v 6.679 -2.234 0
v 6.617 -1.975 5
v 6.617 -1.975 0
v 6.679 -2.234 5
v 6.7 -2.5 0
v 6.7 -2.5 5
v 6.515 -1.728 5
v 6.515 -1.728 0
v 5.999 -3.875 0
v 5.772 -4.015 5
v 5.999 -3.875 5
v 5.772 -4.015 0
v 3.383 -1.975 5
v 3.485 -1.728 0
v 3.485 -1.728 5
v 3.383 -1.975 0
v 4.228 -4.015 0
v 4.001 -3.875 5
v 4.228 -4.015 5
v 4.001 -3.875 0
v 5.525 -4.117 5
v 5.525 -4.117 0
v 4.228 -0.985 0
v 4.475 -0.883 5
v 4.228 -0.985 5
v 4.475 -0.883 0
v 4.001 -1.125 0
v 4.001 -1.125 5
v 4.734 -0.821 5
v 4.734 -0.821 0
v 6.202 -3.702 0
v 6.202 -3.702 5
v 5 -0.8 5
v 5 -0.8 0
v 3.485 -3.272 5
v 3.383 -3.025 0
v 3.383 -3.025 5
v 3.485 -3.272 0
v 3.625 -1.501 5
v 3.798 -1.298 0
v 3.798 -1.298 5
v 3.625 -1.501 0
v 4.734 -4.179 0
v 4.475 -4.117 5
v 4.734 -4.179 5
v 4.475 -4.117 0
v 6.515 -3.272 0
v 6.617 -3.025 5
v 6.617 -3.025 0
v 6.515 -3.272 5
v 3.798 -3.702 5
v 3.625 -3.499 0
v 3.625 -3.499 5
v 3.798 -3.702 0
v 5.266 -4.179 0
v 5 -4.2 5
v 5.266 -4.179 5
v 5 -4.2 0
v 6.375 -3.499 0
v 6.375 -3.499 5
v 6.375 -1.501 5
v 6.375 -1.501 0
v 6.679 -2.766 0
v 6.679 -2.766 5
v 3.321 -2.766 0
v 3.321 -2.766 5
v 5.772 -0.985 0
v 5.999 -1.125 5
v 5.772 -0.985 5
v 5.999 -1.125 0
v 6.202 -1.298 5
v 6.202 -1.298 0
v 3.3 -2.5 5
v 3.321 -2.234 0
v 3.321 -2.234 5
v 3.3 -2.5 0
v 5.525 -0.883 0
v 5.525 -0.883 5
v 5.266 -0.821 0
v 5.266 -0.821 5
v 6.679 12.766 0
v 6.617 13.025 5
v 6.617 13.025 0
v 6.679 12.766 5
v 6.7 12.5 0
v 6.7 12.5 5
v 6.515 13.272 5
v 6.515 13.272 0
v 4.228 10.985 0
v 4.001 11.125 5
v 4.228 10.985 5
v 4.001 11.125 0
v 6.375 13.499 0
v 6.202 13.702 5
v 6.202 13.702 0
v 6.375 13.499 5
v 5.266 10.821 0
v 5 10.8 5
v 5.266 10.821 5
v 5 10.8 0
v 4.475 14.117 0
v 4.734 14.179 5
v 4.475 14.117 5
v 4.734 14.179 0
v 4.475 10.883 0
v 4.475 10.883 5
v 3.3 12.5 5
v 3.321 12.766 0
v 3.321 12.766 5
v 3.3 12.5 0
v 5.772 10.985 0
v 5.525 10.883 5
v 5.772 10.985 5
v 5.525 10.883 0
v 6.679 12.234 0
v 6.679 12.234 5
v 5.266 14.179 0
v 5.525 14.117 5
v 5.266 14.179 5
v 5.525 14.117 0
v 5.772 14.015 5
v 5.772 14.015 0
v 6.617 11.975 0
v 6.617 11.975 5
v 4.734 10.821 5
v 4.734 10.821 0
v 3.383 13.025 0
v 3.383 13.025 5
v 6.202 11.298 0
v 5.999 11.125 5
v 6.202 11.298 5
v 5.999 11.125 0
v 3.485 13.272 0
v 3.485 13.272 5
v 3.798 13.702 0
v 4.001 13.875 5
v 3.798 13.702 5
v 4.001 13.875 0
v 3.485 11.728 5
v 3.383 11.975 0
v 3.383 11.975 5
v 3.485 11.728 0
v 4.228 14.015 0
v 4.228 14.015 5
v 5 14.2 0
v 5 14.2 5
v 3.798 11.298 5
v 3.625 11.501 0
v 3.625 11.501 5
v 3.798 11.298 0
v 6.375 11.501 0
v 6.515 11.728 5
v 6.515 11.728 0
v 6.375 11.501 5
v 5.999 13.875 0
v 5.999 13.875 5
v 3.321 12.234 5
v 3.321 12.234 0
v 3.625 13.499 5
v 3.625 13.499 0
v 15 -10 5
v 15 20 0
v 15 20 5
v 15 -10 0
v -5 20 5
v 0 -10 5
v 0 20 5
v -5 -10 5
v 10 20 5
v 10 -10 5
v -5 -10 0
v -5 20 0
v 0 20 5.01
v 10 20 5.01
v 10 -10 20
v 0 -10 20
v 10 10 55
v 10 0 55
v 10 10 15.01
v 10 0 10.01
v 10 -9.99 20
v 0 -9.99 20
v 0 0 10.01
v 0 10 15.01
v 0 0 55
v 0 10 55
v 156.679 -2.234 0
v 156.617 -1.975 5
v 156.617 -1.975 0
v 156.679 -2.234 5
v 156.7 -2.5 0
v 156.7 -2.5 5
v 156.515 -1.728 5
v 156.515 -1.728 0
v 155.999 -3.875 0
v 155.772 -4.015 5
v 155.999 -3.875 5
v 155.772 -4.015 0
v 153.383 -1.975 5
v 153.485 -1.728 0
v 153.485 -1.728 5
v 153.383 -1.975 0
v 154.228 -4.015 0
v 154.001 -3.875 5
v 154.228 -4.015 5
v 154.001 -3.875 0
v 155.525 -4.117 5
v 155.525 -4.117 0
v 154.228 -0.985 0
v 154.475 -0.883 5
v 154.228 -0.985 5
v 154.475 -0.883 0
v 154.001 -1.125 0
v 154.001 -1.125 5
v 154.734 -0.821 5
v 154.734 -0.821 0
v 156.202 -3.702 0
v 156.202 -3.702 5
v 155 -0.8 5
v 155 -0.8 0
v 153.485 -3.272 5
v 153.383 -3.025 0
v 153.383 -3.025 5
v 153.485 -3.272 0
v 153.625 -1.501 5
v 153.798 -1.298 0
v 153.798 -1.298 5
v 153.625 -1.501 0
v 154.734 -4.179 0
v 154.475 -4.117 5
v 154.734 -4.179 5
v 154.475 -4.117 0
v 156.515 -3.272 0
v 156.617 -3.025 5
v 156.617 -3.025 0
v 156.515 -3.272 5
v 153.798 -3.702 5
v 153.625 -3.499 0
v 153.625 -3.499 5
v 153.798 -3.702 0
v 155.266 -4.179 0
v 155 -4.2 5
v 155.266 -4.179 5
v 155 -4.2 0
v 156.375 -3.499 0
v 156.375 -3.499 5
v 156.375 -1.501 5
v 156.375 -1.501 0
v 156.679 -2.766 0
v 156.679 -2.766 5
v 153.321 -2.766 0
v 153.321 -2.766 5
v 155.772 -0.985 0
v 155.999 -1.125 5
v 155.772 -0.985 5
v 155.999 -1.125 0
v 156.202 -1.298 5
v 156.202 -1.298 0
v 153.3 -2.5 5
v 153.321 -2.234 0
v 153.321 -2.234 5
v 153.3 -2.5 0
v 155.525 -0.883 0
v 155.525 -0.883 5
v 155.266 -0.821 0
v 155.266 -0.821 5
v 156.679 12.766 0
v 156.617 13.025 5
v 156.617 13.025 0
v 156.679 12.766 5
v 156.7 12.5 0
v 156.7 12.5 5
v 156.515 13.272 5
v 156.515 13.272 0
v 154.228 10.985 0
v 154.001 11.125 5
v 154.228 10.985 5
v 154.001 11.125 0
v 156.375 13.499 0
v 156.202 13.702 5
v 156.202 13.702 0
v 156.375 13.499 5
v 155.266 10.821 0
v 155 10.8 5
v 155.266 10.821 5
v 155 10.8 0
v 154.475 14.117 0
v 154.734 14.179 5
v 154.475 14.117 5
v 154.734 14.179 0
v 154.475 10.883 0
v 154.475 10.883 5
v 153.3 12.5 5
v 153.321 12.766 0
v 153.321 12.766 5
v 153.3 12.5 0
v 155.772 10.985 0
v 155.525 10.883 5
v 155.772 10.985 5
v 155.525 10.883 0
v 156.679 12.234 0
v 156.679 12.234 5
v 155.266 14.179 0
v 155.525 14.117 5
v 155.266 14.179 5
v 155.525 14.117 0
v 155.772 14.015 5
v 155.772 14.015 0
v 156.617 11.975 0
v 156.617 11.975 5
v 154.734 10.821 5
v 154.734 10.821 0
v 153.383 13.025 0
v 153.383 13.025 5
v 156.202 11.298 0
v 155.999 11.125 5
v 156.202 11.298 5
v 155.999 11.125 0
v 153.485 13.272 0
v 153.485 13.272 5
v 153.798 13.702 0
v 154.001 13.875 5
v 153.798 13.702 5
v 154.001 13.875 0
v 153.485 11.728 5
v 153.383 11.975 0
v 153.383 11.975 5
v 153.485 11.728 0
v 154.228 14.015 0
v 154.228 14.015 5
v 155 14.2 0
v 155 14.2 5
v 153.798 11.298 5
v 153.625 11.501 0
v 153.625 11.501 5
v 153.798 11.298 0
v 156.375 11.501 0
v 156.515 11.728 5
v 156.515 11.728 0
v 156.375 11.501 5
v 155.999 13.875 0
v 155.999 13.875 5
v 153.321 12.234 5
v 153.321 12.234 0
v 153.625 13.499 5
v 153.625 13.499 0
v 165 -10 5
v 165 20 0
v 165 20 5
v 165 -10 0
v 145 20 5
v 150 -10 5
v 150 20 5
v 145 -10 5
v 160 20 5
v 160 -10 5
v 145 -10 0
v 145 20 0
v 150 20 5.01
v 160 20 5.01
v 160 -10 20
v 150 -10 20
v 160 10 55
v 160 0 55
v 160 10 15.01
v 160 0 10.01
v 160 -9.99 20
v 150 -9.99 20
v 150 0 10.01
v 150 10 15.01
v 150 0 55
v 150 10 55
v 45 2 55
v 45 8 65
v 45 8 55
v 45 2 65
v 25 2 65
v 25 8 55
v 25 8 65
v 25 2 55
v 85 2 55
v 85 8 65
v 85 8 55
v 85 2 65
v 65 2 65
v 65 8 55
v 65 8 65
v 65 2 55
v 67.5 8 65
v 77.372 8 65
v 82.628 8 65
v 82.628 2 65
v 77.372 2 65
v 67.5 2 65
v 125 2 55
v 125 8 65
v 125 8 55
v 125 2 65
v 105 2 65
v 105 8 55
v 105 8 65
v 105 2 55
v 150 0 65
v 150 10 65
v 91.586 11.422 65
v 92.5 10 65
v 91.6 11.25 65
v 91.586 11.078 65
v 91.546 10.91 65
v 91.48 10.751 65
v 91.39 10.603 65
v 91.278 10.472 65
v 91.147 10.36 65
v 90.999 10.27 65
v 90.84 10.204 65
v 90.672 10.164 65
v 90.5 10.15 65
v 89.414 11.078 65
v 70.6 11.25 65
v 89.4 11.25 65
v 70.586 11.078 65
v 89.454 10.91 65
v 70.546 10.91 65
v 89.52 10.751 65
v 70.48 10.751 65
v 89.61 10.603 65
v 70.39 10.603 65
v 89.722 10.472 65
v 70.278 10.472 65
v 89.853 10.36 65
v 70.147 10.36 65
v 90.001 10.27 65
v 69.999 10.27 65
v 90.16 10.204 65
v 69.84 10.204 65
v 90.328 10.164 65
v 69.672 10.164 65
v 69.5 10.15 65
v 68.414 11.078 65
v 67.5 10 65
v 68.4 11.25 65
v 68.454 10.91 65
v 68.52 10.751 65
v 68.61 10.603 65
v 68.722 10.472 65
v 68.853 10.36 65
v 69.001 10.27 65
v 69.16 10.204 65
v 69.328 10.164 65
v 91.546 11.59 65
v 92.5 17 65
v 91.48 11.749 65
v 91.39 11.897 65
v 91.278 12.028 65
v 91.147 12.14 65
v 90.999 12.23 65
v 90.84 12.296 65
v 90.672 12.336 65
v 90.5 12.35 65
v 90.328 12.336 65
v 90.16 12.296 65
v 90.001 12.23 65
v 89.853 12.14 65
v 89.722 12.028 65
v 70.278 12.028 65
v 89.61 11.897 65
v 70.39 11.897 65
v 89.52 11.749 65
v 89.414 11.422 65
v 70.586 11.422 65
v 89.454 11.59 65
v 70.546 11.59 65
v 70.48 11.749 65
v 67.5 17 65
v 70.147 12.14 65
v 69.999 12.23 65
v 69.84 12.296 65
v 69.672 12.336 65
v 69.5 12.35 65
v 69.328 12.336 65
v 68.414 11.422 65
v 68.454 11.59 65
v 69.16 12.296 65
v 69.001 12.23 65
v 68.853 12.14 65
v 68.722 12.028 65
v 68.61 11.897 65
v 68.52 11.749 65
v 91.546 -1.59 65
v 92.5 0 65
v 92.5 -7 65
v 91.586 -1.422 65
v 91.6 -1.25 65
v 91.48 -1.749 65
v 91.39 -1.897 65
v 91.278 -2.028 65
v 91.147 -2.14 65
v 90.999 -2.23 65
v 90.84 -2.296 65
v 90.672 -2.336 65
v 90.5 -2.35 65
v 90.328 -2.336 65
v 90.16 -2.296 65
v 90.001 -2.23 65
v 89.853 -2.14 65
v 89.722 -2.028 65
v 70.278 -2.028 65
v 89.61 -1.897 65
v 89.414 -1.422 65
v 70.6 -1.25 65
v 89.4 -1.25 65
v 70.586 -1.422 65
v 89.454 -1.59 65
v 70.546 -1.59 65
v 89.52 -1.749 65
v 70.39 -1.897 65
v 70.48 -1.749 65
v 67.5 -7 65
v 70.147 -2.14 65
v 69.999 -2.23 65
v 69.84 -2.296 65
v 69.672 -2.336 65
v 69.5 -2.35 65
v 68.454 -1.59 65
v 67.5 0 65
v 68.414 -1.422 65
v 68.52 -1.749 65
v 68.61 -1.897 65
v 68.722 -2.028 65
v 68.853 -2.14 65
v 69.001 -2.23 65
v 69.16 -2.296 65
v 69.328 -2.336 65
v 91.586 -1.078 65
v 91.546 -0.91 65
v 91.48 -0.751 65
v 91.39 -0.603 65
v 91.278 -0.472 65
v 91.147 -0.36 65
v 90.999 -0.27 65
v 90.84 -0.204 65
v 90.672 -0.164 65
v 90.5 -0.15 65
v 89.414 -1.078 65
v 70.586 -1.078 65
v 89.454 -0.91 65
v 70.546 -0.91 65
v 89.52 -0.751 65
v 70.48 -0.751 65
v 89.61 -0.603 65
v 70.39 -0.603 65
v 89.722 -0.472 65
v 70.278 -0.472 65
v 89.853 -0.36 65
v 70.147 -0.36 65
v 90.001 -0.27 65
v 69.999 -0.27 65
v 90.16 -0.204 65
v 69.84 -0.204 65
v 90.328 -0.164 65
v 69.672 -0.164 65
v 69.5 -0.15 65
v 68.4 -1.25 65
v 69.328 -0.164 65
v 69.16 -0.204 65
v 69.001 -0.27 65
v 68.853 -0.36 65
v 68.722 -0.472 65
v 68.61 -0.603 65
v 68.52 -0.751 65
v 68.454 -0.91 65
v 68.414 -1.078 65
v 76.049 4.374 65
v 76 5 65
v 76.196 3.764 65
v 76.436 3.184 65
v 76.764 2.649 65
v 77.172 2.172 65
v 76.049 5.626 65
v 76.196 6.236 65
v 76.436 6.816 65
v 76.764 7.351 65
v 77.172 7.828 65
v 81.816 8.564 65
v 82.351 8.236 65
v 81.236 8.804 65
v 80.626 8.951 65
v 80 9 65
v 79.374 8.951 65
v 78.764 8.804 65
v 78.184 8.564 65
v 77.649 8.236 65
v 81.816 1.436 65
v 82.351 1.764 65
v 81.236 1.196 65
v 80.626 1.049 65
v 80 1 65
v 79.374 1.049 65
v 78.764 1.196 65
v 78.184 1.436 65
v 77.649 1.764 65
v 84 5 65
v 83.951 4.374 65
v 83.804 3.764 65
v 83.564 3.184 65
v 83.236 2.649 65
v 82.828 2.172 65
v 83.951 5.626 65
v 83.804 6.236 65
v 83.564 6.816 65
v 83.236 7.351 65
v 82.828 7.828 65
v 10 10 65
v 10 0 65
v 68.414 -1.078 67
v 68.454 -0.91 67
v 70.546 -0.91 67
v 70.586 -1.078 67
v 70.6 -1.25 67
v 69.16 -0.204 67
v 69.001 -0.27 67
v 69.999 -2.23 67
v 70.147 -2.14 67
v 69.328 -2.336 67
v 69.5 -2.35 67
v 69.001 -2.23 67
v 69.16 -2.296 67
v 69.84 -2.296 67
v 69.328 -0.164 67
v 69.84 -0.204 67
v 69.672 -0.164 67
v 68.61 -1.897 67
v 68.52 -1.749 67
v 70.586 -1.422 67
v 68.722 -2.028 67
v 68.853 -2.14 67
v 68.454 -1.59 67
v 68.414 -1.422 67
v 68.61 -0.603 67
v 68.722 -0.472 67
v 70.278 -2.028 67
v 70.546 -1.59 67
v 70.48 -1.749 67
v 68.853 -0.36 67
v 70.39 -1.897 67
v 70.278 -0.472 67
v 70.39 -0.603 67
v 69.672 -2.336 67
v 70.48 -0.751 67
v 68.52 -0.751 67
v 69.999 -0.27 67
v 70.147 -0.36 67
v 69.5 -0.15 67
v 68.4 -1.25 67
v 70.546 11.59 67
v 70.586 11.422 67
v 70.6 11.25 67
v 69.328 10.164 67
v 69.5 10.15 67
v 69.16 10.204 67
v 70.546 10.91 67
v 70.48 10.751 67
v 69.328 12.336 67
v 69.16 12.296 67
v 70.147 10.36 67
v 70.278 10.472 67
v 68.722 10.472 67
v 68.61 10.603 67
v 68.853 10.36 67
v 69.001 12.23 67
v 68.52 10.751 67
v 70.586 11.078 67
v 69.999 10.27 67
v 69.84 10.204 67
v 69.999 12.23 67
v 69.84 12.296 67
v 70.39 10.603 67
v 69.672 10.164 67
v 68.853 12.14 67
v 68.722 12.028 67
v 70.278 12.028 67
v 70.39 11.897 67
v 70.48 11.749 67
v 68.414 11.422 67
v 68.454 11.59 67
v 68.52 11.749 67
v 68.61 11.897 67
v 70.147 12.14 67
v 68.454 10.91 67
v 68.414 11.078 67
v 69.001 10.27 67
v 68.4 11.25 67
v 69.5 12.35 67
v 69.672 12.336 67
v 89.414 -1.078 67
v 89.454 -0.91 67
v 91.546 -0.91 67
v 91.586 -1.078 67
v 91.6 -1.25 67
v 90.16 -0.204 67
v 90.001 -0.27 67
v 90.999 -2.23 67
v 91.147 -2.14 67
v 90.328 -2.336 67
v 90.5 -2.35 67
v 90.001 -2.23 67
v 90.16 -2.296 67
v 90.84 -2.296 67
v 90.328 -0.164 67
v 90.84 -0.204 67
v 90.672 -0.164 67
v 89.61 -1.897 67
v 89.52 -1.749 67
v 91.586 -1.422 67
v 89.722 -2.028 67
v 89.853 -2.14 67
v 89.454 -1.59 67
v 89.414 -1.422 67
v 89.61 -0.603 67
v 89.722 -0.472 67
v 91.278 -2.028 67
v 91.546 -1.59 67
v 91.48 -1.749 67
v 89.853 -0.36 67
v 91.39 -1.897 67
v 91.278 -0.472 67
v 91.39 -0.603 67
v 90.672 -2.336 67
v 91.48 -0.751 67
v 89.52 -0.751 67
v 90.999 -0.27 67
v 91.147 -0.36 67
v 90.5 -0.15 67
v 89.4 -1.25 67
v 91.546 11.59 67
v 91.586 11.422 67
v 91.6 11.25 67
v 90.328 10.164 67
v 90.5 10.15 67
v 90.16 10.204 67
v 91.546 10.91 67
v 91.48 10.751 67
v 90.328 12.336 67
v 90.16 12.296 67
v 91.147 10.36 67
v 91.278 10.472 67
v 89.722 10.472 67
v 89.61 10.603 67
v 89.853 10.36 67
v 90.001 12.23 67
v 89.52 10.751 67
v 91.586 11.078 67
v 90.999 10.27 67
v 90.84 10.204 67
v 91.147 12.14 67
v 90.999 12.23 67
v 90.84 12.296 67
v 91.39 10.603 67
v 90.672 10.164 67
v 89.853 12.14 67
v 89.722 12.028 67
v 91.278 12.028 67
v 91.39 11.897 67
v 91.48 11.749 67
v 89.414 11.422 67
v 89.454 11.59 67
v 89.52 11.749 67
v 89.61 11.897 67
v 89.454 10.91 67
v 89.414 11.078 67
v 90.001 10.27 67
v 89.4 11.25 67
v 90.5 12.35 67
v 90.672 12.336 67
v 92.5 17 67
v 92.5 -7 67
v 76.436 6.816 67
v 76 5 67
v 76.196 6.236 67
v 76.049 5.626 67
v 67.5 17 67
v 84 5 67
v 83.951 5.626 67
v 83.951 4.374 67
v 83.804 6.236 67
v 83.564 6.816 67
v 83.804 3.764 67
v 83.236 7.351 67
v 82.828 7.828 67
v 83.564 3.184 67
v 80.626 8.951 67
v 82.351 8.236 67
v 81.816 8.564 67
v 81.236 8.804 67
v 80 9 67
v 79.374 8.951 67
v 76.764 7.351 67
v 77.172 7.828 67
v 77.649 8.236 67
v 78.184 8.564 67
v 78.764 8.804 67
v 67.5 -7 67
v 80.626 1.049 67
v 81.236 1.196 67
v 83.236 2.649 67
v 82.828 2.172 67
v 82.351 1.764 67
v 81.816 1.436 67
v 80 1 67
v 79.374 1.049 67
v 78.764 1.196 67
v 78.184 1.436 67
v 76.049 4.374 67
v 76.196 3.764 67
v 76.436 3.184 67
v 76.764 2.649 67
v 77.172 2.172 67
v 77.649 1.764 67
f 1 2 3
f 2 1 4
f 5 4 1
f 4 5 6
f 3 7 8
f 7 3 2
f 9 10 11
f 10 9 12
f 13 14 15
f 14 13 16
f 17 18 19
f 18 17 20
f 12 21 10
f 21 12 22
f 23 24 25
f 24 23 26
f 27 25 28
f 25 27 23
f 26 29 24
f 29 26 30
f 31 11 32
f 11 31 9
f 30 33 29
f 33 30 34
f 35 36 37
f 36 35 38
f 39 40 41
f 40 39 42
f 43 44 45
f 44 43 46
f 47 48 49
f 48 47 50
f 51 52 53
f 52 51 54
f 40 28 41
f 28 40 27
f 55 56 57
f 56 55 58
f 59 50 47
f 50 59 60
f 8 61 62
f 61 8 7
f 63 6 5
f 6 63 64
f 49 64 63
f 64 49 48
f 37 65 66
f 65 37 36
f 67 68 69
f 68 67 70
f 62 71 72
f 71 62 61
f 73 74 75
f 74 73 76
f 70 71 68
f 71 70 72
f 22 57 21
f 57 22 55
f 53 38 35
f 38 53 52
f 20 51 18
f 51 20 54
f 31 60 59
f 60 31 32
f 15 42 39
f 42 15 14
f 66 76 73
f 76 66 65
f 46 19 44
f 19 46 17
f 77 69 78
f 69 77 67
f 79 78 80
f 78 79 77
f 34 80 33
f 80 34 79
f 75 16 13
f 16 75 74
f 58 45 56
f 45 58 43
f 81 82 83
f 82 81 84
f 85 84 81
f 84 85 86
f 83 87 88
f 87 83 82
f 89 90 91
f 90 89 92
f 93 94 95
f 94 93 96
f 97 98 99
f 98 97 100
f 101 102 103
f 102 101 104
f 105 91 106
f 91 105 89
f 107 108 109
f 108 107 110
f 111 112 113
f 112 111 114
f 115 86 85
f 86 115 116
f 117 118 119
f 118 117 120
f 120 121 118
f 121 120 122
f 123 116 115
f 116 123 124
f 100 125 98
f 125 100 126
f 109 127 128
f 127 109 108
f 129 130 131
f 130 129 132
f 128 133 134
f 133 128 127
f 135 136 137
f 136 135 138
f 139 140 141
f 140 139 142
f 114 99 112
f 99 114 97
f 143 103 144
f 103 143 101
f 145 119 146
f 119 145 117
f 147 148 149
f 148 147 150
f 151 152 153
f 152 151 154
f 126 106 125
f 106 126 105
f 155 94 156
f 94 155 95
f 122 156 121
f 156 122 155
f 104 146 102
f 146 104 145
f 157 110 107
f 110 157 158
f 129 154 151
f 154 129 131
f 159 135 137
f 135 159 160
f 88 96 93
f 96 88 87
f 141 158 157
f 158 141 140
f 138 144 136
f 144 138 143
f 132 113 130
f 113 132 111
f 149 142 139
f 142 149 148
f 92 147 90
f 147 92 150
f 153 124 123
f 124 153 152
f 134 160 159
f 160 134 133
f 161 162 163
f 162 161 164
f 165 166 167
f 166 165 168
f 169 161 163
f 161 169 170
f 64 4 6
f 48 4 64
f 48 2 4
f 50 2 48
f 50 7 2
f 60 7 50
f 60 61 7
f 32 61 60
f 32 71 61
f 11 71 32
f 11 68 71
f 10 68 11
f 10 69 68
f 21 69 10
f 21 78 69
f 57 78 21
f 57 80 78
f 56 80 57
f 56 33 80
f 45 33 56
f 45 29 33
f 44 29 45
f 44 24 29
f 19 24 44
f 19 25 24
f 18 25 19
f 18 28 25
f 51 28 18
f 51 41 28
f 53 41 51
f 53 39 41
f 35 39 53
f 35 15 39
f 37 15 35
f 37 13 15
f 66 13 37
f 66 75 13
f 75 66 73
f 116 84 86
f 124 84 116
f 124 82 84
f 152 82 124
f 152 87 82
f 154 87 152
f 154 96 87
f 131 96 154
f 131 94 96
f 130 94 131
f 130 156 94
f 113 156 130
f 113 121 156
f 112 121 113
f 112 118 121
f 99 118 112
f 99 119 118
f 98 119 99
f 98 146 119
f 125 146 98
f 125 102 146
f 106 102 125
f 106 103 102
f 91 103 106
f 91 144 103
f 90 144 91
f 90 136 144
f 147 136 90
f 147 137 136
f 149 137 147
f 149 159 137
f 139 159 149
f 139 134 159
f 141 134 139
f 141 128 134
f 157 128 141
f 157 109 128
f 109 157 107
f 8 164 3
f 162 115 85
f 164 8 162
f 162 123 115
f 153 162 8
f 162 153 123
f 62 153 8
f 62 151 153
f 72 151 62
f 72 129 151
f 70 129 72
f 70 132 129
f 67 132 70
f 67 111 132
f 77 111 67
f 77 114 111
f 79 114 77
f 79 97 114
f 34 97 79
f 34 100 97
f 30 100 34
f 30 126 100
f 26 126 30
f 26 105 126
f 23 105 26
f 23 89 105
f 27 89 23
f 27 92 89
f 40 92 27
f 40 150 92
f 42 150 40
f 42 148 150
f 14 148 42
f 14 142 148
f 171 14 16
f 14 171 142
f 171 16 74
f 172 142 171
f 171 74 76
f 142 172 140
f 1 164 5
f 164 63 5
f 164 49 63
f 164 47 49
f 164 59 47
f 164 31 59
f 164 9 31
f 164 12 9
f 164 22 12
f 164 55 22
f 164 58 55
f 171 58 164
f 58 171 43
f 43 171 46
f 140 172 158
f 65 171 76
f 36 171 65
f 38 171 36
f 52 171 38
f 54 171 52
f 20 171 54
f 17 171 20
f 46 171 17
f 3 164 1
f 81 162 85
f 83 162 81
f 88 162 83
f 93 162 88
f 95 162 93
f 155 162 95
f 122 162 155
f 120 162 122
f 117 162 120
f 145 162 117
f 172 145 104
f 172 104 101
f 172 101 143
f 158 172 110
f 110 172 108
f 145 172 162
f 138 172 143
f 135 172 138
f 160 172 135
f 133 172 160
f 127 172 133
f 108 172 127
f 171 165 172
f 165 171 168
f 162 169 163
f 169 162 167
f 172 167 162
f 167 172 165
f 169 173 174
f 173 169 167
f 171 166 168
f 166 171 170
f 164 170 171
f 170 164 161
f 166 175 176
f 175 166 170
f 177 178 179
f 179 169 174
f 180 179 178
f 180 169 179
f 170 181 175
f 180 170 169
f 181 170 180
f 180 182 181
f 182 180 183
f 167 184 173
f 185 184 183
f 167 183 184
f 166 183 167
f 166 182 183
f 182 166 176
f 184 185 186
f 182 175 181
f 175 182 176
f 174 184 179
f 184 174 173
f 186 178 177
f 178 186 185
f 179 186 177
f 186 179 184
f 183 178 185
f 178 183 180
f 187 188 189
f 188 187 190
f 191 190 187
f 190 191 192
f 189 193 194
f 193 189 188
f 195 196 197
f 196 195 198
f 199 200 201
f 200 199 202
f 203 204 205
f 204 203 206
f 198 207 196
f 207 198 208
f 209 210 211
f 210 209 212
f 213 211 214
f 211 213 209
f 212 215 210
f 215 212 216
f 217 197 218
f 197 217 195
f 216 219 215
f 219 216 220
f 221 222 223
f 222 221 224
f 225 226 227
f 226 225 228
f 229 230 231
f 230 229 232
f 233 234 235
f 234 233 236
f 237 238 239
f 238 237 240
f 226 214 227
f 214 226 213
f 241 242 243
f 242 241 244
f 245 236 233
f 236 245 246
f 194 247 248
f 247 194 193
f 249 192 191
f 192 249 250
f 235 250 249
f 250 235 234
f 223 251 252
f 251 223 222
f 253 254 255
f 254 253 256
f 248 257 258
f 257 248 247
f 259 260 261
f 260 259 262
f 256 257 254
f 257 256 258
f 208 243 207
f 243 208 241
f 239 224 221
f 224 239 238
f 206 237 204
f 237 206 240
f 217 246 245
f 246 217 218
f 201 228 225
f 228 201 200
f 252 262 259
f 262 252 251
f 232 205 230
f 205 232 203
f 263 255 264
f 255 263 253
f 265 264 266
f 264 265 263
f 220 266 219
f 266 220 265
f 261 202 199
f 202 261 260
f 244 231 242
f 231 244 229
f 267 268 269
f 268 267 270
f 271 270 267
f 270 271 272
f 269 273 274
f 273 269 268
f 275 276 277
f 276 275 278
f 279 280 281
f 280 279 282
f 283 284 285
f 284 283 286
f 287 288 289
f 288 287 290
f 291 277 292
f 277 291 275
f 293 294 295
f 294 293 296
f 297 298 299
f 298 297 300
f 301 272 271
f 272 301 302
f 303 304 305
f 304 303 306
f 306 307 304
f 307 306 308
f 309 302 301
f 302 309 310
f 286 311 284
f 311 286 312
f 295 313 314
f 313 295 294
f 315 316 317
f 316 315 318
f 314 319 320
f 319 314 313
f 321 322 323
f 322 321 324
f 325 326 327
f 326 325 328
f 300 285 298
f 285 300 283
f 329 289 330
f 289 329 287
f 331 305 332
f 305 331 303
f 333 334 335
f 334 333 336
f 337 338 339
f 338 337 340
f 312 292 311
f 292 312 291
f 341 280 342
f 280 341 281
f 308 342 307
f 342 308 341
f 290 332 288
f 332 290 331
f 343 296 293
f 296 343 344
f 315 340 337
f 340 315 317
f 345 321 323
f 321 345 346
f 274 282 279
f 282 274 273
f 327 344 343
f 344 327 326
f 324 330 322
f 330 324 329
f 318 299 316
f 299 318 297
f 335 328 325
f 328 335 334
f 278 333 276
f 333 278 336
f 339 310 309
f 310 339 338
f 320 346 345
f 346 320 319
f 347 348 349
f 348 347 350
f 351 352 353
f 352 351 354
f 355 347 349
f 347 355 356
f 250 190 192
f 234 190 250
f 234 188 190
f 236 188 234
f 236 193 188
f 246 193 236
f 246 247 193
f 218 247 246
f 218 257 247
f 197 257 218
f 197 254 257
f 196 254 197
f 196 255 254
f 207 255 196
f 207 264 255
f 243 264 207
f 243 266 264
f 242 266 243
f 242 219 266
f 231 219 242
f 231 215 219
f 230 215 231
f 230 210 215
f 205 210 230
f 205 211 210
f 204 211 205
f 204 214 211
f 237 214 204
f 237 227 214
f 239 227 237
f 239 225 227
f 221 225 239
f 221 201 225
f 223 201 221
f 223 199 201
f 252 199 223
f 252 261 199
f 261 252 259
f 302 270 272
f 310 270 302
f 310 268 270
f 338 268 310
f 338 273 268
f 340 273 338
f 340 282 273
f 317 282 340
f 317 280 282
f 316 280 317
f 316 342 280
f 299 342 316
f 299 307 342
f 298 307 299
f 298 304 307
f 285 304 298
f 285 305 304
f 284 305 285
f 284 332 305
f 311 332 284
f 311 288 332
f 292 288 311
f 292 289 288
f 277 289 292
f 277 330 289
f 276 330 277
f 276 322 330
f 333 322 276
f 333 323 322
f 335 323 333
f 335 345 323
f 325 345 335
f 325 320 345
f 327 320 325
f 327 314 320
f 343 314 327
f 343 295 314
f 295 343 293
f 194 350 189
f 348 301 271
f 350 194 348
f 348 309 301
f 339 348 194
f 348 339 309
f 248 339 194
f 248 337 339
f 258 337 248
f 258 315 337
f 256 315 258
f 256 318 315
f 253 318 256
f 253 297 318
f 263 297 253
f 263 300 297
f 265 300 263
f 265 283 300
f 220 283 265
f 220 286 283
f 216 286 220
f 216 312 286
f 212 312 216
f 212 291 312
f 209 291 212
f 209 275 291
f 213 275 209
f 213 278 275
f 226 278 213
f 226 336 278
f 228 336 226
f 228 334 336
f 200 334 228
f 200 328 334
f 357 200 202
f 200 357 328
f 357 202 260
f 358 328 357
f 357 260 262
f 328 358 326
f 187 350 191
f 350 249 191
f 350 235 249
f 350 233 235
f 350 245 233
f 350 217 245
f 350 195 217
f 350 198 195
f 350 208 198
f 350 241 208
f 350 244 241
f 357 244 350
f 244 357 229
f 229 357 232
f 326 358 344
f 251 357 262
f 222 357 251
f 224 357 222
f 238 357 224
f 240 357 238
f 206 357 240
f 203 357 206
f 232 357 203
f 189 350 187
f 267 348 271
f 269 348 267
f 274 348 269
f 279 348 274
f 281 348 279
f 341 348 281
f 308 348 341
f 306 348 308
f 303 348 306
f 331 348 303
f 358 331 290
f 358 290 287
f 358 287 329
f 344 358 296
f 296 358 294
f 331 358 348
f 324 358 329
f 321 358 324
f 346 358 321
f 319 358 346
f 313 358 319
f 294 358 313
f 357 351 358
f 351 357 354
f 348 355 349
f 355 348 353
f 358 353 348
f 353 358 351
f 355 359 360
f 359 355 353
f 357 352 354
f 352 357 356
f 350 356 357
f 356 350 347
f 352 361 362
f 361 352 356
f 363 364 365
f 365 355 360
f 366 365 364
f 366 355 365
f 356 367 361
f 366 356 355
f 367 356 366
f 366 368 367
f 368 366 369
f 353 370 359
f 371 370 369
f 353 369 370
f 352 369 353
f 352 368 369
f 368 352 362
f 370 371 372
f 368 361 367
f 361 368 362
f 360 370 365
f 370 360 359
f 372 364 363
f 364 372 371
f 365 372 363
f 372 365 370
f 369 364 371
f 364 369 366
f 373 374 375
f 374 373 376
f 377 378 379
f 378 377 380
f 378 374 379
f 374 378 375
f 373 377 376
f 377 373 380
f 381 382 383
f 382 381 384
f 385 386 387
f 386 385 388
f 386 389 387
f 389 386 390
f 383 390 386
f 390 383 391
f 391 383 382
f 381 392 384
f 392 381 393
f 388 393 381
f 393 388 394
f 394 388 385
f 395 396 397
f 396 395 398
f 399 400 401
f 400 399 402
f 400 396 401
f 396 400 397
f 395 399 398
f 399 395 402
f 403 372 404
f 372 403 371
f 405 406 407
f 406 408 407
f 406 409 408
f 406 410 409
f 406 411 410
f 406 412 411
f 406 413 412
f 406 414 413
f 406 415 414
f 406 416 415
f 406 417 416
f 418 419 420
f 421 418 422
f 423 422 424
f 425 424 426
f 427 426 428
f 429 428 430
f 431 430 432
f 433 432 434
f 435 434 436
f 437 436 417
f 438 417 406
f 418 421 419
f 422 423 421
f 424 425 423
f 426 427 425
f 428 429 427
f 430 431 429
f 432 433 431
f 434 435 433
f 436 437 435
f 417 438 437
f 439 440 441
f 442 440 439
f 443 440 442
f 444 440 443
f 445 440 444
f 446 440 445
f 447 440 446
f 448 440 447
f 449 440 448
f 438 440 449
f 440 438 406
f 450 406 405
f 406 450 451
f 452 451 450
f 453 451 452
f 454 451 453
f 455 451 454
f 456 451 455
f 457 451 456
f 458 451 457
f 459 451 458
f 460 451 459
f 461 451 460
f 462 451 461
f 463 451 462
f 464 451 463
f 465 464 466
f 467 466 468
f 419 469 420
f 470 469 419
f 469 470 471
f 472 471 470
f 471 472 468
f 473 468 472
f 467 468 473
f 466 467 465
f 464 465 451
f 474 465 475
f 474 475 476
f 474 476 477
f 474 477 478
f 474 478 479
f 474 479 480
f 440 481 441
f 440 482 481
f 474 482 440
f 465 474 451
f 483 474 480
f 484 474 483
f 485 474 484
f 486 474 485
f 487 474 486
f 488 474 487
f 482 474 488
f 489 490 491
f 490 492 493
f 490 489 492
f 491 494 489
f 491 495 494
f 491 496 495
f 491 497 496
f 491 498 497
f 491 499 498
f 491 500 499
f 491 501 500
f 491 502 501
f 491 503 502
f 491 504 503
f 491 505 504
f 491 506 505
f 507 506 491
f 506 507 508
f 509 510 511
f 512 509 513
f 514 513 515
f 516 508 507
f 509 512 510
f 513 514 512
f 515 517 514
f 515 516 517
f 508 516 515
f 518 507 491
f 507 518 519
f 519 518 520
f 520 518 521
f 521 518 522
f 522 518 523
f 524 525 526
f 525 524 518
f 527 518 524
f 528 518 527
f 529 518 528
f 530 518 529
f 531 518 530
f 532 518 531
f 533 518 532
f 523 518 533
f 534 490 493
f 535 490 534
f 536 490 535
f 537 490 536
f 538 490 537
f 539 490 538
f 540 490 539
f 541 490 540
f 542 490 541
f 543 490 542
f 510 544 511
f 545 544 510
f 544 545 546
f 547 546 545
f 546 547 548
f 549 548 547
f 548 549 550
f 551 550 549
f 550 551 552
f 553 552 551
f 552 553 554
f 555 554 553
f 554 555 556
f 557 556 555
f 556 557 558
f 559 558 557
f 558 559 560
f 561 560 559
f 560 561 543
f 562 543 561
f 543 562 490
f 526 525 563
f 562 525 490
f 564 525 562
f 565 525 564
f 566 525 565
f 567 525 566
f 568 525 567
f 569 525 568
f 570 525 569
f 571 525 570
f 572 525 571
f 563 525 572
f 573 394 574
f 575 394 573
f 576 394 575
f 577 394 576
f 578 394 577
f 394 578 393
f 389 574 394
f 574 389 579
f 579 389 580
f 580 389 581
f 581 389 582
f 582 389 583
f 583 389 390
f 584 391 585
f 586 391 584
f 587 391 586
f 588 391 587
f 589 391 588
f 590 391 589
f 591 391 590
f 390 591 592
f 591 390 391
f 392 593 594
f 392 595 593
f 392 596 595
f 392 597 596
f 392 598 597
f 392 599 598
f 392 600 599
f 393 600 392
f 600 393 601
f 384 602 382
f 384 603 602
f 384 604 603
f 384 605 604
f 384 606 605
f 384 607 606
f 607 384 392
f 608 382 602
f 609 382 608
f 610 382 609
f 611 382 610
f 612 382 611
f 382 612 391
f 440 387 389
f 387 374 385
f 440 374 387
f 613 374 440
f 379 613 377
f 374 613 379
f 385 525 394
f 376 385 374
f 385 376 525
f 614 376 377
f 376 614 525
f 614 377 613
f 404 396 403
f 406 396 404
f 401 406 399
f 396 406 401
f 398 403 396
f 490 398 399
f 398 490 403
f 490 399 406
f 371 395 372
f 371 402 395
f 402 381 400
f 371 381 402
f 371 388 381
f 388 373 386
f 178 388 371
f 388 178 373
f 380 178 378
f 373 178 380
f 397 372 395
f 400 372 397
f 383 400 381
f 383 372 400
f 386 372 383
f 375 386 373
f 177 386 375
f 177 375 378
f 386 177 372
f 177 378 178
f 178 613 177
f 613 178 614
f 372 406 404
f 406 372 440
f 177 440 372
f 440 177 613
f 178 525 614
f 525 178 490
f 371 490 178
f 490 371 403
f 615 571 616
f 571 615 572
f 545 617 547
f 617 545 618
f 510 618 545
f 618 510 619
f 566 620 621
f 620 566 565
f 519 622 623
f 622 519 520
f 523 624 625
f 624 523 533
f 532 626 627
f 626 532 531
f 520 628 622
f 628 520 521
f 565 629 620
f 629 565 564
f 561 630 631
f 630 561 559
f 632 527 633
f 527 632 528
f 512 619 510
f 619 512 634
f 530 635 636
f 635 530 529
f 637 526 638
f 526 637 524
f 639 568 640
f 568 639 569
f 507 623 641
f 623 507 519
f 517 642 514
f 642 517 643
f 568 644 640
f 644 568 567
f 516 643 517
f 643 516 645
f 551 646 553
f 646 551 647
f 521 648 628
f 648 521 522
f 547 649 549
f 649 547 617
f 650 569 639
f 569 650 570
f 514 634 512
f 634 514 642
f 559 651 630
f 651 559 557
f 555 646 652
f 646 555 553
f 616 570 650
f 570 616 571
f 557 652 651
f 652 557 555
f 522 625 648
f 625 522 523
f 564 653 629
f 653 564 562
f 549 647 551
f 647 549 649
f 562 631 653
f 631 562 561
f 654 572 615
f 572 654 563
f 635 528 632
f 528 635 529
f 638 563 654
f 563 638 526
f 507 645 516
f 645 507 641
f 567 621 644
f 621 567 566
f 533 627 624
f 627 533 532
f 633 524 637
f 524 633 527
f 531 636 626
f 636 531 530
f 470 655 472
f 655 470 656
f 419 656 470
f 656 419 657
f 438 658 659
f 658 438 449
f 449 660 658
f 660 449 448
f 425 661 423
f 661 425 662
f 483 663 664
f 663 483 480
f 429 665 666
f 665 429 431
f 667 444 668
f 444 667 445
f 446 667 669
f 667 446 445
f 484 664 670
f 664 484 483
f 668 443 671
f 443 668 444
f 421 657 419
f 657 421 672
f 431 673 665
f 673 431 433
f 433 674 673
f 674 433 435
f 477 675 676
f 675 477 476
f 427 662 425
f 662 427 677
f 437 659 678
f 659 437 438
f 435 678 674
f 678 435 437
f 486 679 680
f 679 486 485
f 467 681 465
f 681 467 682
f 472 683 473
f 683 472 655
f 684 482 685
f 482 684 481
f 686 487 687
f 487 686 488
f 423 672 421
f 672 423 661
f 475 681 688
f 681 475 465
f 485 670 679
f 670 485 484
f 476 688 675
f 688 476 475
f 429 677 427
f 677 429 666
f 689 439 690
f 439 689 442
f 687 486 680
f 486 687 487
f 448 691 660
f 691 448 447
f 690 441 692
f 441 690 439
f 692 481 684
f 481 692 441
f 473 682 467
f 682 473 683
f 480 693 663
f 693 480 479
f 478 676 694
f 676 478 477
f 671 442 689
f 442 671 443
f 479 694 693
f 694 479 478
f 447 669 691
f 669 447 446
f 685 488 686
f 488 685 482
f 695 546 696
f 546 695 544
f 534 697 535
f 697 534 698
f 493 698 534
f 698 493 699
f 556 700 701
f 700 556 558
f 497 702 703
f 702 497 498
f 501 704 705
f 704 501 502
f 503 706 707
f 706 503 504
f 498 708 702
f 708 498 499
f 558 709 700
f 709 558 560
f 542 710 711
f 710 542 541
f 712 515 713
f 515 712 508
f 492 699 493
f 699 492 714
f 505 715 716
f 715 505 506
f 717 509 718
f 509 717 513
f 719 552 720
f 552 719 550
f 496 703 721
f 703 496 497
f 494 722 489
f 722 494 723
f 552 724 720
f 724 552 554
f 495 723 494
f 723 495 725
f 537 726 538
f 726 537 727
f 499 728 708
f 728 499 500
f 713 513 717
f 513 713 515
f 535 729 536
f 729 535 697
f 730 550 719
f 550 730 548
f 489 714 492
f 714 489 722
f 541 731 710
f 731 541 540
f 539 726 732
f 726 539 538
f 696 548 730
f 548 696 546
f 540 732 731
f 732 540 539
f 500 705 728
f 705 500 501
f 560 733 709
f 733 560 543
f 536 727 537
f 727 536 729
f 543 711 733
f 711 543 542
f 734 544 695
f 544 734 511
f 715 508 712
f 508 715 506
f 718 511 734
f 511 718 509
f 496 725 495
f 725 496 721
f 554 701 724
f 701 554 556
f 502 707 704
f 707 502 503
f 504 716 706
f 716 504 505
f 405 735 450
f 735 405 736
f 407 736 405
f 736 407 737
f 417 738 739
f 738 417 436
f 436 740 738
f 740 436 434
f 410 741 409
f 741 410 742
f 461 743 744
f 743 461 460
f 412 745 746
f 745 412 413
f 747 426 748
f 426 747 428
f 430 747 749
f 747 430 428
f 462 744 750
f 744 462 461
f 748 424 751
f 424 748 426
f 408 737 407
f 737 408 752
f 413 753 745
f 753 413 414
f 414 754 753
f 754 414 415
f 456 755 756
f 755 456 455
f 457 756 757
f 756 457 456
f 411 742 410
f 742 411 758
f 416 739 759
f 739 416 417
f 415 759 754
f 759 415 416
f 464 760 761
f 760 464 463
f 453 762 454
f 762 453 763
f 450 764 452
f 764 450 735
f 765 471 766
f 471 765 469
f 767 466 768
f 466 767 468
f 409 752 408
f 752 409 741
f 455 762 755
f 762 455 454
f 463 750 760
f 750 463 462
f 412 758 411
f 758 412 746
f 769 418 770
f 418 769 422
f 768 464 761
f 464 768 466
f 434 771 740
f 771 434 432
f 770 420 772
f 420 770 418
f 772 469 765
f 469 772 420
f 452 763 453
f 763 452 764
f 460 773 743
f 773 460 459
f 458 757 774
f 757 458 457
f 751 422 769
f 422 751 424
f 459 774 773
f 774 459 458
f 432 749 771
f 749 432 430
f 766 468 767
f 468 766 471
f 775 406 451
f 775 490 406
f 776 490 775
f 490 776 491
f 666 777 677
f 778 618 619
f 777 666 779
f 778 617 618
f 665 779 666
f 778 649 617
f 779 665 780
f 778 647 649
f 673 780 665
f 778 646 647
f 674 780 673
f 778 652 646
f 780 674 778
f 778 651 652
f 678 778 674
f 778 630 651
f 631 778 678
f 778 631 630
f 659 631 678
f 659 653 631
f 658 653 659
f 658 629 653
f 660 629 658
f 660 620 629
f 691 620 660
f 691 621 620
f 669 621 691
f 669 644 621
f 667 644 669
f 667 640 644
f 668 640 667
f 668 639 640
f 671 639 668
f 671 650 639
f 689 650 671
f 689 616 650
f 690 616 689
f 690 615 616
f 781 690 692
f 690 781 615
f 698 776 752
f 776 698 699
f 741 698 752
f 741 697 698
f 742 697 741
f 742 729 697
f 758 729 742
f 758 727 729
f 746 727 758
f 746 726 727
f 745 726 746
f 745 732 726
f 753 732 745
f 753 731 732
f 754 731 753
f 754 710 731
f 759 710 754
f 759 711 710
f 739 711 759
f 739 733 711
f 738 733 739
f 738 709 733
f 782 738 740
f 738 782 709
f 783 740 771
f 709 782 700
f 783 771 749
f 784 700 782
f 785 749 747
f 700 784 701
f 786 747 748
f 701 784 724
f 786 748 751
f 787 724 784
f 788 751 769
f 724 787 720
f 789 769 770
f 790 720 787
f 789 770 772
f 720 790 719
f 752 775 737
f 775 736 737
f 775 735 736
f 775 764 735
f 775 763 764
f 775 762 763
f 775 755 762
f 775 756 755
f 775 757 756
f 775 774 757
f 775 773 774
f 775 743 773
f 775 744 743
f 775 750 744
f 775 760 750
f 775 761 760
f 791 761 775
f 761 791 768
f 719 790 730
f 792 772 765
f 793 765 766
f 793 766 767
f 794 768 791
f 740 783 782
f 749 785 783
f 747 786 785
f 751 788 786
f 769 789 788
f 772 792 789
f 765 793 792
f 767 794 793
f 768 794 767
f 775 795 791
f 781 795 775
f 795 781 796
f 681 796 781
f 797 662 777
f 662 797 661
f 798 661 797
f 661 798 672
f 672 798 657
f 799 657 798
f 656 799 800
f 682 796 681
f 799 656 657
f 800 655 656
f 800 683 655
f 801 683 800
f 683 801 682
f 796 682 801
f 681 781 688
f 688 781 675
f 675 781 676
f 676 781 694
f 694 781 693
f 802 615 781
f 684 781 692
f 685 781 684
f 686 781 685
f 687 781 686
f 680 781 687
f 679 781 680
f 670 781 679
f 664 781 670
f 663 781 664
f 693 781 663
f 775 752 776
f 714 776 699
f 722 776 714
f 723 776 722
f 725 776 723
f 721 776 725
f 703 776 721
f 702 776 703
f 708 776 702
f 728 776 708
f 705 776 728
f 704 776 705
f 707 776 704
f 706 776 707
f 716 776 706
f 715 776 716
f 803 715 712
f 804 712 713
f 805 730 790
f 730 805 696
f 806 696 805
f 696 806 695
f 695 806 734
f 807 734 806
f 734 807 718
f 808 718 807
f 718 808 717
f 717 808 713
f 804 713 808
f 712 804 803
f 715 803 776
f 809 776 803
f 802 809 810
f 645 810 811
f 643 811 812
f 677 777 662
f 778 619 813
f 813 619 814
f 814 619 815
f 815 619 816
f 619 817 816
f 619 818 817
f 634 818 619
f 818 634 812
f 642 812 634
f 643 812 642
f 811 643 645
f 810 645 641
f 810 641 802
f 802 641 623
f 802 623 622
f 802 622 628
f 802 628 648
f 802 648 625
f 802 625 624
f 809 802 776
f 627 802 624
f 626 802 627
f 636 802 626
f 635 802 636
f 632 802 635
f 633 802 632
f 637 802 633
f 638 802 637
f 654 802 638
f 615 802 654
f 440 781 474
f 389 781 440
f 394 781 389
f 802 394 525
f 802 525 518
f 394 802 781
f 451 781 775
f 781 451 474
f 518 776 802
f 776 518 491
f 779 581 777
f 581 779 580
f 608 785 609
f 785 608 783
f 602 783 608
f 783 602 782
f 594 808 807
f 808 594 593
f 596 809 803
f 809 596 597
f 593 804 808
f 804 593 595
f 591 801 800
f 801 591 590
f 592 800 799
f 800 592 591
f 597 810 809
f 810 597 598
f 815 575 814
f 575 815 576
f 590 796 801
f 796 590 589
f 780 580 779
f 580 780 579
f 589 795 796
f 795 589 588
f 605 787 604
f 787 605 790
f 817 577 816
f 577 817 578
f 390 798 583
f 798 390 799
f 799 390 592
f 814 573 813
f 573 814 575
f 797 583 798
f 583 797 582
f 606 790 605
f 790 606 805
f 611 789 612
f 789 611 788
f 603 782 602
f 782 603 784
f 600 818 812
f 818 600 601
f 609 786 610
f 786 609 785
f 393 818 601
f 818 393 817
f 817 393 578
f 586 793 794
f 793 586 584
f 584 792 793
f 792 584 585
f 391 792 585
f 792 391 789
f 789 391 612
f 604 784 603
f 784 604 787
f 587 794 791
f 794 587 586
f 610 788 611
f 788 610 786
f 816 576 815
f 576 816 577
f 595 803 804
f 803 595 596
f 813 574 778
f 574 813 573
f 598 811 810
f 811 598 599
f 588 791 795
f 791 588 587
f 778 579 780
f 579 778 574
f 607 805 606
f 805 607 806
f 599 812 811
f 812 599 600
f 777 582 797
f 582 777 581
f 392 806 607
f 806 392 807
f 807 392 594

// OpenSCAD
// FoldIt Robot - Camera Gantry
// Overhead mount for Pi Camera v2
// Two vertical posts with horizontal crossbar and camera mount plate
// Scale: 1:4 (posts ~50mm tall representing ~200mm full scale)

$fn = 40;

// Gantry parameters
post_height = 50;         // vertical post height (200mm full / 4)
post_width = 10;          // square post cross-section
post_depth = 10;
crossbar_length = 140;    // span between posts (slightly less than base width)
crossbar_width = 10;
crossbar_height = 10;

// Base foot parameters
foot_length = 30;         // depth of the base foot
foot_width = 20;          // width of the base foot
foot_height = 5;          // thickness of the base foot
foot_spacing = 15;        // hole spacing on foot (matches base plate gantry holes)

// Pi Camera v2 mount plate
cam_plate_w = 25;         // camera board width
cam_plate_l = 24;         // camera board length
cam_plate_h = 2;          // mount plate thickness
cam_hole_spacing_w = 21;  // horizontal hole spacing on Pi Cam v2
cam_hole_spacing_l = 12.5; // vertical hole spacing on Pi Cam v2
cam_hole_d = 2.2;         // M2 holes for Pi Camera

// Hardware
m3_hole = 3.4;

module camera_gantry() {
    // Left post with foot
    translate([0, 0, 0])
        _post_with_foot();

    // Right post with foot
    translate([crossbar_length + post_width, 0, 0])
        _post_with_foot();

    // Horizontal crossbar connecting the two posts at the top
    translate([post_width, (post_depth - crossbar_width) / 2, post_height + foot_height])
        _crossbar();

    // Camera mount plate at center of crossbar
    translate([(crossbar_length + post_width * 2) / 2,
               post_depth / 2,
               post_height + foot_height + crossbar_height])
        _camera_mount();
}

module _post_with_foot() {
    // Base foot
    difference() {
        translate([-(foot_width - post_width) / 2, -(foot_length - post_depth) / 2, 0])
            cube([foot_width, foot_length, foot_height]);

        // Mounting holes in foot (2 holes matching base plate)
        for (y_off = [0, foot_spacing]) {
            translate([post_width / 2,
                       post_depth / 2 - foot_spacing / 2 + y_off,
                       -0.5])
                cylinder(d=m3_hole, h=foot_height + 1);
        }
    }

    // Vertical post
    translate([0, 0, foot_height])
        cube([post_width, post_depth, post_height]);

    // Triangular gussets for rigidity (front and back)
    for (side = [0, 1]) {
        y_pos = side == 0 ? 0 : post_depth;
        mirror_y = side == 0 ? 0 : 1;
        translate([0, 0, foot_height])
            _gusset(side);
    }
}

module _gusset(side) {
    gusset_h = 15;
    gusset_l = 15;
    gusset_w = post_width;

    if (side == 0) {
        // Front gusset
        translate([0, -gusset_l + post_depth / 2, 0])
            hull() {
                cube([gusset_w, 0.01, gusset_h]);
                cube([gusset_w, gusset_l, 0.01]);
            }
    } else {
        // Back gusset
        translate([0, post_depth / 2, 0])
            hull() {
                cube([gusset_w, 0.01, gusset_h]);
                cube([gusset_w, gusset_l, 0.01]);
            }
    }
}

module _crossbar() {
    difference() {
        cube([crossbar_length, crossbar_width, crossbar_height]);

        // Weight reduction slots (optional, for less material)
        slot_count = 3;
        slot_width = (crossbar_length - 20) / (slot_count * 2);
        for (i = [0:slot_count - 1]) {
            translate([15 + i * slot_width * 2, 2, -0.5])
                cube([slot_width, crossbar_width - 4, crossbar_height + 1]);
        }
    }
}

module _camera_mount() {
    // Small platform for Pi Camera v2
    difference() {
        // Mount plate centered at origin
        translate([-cam_plate_w / 2, -cam_plate_l / 2, 0])
            cube([cam_plate_w, cam_plate_l, cam_plate_h]);

        // Pi Camera v2 mounting holes (M2, 4 holes)
        for (x = [-cam_hole_spacing_w / 2, cam_hole_spacing_w / 2])
            for (y = [-cam_hole_spacing_l / 2, cam_hole_spacing_l / 2])
                translate([x, y, -0.5])
                    cylinder(d=cam_hole_d, h=cam_plate_h + 1);

        // Center hole for camera lens
        translate([0, 0, -0.5])
            cylinder(d=8, h=cam_plate_h + 1);
    }
}

// Render when opened directly
camera_gantry();
